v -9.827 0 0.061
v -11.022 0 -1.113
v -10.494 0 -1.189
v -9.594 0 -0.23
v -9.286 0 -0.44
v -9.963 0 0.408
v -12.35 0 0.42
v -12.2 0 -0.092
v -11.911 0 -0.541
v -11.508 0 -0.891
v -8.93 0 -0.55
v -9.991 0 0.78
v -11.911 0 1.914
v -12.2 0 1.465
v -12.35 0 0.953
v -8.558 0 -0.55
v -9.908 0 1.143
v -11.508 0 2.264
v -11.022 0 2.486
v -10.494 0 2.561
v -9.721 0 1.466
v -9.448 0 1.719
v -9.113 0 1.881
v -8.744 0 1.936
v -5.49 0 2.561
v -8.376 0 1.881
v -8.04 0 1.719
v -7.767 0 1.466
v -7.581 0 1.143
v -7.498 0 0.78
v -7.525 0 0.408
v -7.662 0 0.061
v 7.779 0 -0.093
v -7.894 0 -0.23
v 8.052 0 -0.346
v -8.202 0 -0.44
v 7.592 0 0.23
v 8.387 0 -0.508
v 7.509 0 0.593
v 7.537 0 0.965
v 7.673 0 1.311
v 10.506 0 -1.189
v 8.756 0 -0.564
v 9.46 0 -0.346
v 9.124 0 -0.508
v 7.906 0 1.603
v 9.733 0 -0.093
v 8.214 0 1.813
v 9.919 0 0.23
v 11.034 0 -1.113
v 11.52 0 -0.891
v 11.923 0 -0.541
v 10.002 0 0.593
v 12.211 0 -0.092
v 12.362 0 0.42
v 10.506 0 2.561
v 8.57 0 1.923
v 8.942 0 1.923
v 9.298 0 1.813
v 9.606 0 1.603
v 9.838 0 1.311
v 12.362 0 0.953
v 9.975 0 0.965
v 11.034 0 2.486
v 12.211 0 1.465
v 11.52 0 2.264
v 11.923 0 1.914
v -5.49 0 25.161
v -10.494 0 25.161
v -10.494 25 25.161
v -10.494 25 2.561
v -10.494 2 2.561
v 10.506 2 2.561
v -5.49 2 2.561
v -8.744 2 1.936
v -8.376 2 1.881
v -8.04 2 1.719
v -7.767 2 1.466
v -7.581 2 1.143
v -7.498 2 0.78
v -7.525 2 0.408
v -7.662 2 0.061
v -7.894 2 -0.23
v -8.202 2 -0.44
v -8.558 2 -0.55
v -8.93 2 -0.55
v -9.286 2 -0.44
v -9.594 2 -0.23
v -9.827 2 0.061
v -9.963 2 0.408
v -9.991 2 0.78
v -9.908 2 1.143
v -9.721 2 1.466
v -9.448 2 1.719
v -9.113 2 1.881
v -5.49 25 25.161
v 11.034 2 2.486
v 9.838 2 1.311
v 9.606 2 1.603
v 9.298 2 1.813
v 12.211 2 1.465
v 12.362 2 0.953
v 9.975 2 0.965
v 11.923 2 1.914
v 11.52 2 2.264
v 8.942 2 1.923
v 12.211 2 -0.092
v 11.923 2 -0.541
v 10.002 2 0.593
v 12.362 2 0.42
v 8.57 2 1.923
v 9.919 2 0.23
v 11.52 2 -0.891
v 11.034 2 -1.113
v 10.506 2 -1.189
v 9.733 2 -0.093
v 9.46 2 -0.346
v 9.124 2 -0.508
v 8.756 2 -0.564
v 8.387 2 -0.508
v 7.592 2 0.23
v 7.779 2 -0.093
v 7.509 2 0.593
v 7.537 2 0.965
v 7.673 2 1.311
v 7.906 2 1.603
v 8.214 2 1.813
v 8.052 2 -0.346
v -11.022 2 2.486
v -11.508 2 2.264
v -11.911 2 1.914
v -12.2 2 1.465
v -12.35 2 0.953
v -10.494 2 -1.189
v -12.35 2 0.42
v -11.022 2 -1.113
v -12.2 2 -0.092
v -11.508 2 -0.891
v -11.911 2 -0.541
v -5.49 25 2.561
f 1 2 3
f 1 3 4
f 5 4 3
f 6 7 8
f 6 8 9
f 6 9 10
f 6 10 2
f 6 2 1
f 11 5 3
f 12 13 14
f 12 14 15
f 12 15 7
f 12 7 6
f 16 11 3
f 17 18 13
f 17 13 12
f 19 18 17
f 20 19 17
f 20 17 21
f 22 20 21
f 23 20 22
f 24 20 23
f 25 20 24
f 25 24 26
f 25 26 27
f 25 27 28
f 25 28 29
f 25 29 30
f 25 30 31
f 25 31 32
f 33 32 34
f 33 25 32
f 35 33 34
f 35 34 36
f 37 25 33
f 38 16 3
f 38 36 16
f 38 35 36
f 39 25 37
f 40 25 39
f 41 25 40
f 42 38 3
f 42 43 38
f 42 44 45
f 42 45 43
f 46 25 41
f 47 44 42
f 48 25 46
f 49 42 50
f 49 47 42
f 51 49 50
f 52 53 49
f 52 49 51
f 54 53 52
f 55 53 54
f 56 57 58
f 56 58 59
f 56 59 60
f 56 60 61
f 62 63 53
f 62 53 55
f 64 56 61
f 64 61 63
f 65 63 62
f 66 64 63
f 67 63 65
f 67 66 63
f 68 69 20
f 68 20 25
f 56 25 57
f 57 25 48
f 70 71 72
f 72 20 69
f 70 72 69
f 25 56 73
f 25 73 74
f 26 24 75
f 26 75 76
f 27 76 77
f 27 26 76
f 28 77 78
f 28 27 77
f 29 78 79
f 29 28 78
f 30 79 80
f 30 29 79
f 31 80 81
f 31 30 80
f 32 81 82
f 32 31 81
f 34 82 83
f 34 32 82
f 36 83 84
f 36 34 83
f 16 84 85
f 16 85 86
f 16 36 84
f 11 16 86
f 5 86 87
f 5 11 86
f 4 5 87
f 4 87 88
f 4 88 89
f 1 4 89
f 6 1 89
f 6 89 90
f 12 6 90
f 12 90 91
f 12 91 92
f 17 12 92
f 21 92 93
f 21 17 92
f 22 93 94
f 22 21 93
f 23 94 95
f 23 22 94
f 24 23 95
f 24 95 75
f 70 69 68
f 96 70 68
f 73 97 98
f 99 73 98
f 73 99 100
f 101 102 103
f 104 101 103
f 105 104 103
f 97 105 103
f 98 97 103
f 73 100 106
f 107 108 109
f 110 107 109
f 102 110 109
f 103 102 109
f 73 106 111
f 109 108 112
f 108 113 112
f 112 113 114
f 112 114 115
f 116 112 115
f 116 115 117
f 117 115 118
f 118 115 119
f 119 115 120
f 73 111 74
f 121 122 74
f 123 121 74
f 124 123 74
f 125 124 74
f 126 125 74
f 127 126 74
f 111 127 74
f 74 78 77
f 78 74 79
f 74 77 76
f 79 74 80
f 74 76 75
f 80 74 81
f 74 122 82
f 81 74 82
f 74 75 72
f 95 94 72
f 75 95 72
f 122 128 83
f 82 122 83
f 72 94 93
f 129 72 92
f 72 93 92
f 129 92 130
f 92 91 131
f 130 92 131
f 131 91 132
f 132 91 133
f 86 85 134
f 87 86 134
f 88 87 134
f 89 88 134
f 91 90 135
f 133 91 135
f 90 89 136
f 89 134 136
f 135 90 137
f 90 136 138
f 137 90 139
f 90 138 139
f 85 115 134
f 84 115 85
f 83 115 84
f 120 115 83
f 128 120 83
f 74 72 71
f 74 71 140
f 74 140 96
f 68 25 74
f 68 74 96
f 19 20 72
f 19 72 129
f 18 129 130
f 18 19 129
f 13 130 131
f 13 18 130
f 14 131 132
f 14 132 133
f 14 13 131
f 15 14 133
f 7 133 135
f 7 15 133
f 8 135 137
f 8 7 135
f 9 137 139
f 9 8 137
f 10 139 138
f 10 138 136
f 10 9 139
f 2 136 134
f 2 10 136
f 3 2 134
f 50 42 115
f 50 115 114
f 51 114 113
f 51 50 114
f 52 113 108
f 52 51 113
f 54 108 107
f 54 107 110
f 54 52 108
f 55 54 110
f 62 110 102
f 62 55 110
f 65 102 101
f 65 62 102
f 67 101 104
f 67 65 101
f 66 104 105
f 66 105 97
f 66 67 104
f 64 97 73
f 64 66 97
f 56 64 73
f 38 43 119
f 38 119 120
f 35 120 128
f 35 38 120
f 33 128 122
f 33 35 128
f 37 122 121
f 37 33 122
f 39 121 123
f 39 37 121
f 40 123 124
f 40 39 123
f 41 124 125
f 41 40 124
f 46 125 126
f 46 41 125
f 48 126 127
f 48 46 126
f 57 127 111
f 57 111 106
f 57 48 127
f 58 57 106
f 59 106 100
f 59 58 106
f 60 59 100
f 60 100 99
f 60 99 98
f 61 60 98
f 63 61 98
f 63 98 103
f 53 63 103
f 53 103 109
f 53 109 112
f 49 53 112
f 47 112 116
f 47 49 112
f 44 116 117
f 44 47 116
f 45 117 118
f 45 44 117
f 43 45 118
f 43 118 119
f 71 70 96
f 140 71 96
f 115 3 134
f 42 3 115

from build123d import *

# Parameters (mm, degrees)
SKETCH1_R           = 1.2499975
BOSS_EXTRUDE1_DEPTH = 1.999996
SKETCH2_W           = 5.0038
SKETCH2_H           = 22.6000056
BOSS_EXTRUDE2_DEPTH = 25.0000008


with BuildPart() as part:
    # Sketch1 → Boss-Extrude1 (new body)
    with BuildSketch(Plane(origin=(0, 0, 0), x_dir=(1, 0, 0), z_dir=(0, 1, 0))):
        with BuildLine():
            Line((-10.494133055, 1.188533953), (10.505875745, 1.188533953))
            ThreePointArc((10.505875745, 1.188533953), (12.380878345, -0.686468647), (10.505875745, -2.561471247))
            Line((10.505875745, -2.561471247), (-10.494133055, -2.561471247))
            ThreePointArc((-10.494133055, -2.561471247), (-12.369135655, -0.686468647), (-10.494133055, 1.188533953))
        make_face()
        with Locations(Location((-8.744123855, -0.686468647, 0), (0, 0, 270))):
            Circle(SKETCH1_R, mode=Mode.SUBTRACT)
        with Locations(Location((8.755866545, -0.686468647, 0), (0, 0, 90))):
            Circle(SKETCH1_R, mode=Mode.SUBTRACT)
    extrude(amount=BOSS_EXTRUDE1_DEPTH)

    # Sketch2 → Boss-Extrude2 (add)
    with BuildSketch(Plane.XZ):
        with Locations((-7.992233055, 13.861474047)):
            Rectangle(SKETCH2_W, SKETCH2_H)
    extrude(amount=-BOSS_EXTRUDE2_DEPTH)


solid = part.part
